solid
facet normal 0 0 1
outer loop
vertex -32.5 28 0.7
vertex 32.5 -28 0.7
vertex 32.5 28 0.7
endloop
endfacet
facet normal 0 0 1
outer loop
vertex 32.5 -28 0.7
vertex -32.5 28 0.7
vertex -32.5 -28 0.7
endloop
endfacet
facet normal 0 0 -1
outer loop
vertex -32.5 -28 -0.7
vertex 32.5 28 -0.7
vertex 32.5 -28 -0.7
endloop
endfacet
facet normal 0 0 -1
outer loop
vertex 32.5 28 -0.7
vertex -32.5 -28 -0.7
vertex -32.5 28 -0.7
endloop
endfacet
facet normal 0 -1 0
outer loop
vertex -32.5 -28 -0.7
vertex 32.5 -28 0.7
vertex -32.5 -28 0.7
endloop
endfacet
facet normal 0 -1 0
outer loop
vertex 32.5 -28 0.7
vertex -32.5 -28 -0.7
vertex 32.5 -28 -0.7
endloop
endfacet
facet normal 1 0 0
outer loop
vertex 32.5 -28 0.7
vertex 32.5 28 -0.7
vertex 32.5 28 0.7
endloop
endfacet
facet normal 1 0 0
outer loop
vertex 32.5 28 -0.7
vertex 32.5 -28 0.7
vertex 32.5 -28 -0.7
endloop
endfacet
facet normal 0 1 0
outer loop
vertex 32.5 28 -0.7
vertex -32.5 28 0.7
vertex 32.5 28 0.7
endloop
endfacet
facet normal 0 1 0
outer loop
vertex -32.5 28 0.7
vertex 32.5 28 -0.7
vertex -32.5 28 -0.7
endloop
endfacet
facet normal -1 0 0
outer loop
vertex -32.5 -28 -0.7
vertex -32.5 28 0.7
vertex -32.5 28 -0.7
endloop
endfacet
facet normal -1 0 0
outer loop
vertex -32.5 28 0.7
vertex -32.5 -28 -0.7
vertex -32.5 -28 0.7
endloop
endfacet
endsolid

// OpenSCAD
$fn=64;

module sbc_board(length=65.0, width=56.0, thickness=1.4) {
    cube([length, width, thickness], center=true);
}

sbc_board();
